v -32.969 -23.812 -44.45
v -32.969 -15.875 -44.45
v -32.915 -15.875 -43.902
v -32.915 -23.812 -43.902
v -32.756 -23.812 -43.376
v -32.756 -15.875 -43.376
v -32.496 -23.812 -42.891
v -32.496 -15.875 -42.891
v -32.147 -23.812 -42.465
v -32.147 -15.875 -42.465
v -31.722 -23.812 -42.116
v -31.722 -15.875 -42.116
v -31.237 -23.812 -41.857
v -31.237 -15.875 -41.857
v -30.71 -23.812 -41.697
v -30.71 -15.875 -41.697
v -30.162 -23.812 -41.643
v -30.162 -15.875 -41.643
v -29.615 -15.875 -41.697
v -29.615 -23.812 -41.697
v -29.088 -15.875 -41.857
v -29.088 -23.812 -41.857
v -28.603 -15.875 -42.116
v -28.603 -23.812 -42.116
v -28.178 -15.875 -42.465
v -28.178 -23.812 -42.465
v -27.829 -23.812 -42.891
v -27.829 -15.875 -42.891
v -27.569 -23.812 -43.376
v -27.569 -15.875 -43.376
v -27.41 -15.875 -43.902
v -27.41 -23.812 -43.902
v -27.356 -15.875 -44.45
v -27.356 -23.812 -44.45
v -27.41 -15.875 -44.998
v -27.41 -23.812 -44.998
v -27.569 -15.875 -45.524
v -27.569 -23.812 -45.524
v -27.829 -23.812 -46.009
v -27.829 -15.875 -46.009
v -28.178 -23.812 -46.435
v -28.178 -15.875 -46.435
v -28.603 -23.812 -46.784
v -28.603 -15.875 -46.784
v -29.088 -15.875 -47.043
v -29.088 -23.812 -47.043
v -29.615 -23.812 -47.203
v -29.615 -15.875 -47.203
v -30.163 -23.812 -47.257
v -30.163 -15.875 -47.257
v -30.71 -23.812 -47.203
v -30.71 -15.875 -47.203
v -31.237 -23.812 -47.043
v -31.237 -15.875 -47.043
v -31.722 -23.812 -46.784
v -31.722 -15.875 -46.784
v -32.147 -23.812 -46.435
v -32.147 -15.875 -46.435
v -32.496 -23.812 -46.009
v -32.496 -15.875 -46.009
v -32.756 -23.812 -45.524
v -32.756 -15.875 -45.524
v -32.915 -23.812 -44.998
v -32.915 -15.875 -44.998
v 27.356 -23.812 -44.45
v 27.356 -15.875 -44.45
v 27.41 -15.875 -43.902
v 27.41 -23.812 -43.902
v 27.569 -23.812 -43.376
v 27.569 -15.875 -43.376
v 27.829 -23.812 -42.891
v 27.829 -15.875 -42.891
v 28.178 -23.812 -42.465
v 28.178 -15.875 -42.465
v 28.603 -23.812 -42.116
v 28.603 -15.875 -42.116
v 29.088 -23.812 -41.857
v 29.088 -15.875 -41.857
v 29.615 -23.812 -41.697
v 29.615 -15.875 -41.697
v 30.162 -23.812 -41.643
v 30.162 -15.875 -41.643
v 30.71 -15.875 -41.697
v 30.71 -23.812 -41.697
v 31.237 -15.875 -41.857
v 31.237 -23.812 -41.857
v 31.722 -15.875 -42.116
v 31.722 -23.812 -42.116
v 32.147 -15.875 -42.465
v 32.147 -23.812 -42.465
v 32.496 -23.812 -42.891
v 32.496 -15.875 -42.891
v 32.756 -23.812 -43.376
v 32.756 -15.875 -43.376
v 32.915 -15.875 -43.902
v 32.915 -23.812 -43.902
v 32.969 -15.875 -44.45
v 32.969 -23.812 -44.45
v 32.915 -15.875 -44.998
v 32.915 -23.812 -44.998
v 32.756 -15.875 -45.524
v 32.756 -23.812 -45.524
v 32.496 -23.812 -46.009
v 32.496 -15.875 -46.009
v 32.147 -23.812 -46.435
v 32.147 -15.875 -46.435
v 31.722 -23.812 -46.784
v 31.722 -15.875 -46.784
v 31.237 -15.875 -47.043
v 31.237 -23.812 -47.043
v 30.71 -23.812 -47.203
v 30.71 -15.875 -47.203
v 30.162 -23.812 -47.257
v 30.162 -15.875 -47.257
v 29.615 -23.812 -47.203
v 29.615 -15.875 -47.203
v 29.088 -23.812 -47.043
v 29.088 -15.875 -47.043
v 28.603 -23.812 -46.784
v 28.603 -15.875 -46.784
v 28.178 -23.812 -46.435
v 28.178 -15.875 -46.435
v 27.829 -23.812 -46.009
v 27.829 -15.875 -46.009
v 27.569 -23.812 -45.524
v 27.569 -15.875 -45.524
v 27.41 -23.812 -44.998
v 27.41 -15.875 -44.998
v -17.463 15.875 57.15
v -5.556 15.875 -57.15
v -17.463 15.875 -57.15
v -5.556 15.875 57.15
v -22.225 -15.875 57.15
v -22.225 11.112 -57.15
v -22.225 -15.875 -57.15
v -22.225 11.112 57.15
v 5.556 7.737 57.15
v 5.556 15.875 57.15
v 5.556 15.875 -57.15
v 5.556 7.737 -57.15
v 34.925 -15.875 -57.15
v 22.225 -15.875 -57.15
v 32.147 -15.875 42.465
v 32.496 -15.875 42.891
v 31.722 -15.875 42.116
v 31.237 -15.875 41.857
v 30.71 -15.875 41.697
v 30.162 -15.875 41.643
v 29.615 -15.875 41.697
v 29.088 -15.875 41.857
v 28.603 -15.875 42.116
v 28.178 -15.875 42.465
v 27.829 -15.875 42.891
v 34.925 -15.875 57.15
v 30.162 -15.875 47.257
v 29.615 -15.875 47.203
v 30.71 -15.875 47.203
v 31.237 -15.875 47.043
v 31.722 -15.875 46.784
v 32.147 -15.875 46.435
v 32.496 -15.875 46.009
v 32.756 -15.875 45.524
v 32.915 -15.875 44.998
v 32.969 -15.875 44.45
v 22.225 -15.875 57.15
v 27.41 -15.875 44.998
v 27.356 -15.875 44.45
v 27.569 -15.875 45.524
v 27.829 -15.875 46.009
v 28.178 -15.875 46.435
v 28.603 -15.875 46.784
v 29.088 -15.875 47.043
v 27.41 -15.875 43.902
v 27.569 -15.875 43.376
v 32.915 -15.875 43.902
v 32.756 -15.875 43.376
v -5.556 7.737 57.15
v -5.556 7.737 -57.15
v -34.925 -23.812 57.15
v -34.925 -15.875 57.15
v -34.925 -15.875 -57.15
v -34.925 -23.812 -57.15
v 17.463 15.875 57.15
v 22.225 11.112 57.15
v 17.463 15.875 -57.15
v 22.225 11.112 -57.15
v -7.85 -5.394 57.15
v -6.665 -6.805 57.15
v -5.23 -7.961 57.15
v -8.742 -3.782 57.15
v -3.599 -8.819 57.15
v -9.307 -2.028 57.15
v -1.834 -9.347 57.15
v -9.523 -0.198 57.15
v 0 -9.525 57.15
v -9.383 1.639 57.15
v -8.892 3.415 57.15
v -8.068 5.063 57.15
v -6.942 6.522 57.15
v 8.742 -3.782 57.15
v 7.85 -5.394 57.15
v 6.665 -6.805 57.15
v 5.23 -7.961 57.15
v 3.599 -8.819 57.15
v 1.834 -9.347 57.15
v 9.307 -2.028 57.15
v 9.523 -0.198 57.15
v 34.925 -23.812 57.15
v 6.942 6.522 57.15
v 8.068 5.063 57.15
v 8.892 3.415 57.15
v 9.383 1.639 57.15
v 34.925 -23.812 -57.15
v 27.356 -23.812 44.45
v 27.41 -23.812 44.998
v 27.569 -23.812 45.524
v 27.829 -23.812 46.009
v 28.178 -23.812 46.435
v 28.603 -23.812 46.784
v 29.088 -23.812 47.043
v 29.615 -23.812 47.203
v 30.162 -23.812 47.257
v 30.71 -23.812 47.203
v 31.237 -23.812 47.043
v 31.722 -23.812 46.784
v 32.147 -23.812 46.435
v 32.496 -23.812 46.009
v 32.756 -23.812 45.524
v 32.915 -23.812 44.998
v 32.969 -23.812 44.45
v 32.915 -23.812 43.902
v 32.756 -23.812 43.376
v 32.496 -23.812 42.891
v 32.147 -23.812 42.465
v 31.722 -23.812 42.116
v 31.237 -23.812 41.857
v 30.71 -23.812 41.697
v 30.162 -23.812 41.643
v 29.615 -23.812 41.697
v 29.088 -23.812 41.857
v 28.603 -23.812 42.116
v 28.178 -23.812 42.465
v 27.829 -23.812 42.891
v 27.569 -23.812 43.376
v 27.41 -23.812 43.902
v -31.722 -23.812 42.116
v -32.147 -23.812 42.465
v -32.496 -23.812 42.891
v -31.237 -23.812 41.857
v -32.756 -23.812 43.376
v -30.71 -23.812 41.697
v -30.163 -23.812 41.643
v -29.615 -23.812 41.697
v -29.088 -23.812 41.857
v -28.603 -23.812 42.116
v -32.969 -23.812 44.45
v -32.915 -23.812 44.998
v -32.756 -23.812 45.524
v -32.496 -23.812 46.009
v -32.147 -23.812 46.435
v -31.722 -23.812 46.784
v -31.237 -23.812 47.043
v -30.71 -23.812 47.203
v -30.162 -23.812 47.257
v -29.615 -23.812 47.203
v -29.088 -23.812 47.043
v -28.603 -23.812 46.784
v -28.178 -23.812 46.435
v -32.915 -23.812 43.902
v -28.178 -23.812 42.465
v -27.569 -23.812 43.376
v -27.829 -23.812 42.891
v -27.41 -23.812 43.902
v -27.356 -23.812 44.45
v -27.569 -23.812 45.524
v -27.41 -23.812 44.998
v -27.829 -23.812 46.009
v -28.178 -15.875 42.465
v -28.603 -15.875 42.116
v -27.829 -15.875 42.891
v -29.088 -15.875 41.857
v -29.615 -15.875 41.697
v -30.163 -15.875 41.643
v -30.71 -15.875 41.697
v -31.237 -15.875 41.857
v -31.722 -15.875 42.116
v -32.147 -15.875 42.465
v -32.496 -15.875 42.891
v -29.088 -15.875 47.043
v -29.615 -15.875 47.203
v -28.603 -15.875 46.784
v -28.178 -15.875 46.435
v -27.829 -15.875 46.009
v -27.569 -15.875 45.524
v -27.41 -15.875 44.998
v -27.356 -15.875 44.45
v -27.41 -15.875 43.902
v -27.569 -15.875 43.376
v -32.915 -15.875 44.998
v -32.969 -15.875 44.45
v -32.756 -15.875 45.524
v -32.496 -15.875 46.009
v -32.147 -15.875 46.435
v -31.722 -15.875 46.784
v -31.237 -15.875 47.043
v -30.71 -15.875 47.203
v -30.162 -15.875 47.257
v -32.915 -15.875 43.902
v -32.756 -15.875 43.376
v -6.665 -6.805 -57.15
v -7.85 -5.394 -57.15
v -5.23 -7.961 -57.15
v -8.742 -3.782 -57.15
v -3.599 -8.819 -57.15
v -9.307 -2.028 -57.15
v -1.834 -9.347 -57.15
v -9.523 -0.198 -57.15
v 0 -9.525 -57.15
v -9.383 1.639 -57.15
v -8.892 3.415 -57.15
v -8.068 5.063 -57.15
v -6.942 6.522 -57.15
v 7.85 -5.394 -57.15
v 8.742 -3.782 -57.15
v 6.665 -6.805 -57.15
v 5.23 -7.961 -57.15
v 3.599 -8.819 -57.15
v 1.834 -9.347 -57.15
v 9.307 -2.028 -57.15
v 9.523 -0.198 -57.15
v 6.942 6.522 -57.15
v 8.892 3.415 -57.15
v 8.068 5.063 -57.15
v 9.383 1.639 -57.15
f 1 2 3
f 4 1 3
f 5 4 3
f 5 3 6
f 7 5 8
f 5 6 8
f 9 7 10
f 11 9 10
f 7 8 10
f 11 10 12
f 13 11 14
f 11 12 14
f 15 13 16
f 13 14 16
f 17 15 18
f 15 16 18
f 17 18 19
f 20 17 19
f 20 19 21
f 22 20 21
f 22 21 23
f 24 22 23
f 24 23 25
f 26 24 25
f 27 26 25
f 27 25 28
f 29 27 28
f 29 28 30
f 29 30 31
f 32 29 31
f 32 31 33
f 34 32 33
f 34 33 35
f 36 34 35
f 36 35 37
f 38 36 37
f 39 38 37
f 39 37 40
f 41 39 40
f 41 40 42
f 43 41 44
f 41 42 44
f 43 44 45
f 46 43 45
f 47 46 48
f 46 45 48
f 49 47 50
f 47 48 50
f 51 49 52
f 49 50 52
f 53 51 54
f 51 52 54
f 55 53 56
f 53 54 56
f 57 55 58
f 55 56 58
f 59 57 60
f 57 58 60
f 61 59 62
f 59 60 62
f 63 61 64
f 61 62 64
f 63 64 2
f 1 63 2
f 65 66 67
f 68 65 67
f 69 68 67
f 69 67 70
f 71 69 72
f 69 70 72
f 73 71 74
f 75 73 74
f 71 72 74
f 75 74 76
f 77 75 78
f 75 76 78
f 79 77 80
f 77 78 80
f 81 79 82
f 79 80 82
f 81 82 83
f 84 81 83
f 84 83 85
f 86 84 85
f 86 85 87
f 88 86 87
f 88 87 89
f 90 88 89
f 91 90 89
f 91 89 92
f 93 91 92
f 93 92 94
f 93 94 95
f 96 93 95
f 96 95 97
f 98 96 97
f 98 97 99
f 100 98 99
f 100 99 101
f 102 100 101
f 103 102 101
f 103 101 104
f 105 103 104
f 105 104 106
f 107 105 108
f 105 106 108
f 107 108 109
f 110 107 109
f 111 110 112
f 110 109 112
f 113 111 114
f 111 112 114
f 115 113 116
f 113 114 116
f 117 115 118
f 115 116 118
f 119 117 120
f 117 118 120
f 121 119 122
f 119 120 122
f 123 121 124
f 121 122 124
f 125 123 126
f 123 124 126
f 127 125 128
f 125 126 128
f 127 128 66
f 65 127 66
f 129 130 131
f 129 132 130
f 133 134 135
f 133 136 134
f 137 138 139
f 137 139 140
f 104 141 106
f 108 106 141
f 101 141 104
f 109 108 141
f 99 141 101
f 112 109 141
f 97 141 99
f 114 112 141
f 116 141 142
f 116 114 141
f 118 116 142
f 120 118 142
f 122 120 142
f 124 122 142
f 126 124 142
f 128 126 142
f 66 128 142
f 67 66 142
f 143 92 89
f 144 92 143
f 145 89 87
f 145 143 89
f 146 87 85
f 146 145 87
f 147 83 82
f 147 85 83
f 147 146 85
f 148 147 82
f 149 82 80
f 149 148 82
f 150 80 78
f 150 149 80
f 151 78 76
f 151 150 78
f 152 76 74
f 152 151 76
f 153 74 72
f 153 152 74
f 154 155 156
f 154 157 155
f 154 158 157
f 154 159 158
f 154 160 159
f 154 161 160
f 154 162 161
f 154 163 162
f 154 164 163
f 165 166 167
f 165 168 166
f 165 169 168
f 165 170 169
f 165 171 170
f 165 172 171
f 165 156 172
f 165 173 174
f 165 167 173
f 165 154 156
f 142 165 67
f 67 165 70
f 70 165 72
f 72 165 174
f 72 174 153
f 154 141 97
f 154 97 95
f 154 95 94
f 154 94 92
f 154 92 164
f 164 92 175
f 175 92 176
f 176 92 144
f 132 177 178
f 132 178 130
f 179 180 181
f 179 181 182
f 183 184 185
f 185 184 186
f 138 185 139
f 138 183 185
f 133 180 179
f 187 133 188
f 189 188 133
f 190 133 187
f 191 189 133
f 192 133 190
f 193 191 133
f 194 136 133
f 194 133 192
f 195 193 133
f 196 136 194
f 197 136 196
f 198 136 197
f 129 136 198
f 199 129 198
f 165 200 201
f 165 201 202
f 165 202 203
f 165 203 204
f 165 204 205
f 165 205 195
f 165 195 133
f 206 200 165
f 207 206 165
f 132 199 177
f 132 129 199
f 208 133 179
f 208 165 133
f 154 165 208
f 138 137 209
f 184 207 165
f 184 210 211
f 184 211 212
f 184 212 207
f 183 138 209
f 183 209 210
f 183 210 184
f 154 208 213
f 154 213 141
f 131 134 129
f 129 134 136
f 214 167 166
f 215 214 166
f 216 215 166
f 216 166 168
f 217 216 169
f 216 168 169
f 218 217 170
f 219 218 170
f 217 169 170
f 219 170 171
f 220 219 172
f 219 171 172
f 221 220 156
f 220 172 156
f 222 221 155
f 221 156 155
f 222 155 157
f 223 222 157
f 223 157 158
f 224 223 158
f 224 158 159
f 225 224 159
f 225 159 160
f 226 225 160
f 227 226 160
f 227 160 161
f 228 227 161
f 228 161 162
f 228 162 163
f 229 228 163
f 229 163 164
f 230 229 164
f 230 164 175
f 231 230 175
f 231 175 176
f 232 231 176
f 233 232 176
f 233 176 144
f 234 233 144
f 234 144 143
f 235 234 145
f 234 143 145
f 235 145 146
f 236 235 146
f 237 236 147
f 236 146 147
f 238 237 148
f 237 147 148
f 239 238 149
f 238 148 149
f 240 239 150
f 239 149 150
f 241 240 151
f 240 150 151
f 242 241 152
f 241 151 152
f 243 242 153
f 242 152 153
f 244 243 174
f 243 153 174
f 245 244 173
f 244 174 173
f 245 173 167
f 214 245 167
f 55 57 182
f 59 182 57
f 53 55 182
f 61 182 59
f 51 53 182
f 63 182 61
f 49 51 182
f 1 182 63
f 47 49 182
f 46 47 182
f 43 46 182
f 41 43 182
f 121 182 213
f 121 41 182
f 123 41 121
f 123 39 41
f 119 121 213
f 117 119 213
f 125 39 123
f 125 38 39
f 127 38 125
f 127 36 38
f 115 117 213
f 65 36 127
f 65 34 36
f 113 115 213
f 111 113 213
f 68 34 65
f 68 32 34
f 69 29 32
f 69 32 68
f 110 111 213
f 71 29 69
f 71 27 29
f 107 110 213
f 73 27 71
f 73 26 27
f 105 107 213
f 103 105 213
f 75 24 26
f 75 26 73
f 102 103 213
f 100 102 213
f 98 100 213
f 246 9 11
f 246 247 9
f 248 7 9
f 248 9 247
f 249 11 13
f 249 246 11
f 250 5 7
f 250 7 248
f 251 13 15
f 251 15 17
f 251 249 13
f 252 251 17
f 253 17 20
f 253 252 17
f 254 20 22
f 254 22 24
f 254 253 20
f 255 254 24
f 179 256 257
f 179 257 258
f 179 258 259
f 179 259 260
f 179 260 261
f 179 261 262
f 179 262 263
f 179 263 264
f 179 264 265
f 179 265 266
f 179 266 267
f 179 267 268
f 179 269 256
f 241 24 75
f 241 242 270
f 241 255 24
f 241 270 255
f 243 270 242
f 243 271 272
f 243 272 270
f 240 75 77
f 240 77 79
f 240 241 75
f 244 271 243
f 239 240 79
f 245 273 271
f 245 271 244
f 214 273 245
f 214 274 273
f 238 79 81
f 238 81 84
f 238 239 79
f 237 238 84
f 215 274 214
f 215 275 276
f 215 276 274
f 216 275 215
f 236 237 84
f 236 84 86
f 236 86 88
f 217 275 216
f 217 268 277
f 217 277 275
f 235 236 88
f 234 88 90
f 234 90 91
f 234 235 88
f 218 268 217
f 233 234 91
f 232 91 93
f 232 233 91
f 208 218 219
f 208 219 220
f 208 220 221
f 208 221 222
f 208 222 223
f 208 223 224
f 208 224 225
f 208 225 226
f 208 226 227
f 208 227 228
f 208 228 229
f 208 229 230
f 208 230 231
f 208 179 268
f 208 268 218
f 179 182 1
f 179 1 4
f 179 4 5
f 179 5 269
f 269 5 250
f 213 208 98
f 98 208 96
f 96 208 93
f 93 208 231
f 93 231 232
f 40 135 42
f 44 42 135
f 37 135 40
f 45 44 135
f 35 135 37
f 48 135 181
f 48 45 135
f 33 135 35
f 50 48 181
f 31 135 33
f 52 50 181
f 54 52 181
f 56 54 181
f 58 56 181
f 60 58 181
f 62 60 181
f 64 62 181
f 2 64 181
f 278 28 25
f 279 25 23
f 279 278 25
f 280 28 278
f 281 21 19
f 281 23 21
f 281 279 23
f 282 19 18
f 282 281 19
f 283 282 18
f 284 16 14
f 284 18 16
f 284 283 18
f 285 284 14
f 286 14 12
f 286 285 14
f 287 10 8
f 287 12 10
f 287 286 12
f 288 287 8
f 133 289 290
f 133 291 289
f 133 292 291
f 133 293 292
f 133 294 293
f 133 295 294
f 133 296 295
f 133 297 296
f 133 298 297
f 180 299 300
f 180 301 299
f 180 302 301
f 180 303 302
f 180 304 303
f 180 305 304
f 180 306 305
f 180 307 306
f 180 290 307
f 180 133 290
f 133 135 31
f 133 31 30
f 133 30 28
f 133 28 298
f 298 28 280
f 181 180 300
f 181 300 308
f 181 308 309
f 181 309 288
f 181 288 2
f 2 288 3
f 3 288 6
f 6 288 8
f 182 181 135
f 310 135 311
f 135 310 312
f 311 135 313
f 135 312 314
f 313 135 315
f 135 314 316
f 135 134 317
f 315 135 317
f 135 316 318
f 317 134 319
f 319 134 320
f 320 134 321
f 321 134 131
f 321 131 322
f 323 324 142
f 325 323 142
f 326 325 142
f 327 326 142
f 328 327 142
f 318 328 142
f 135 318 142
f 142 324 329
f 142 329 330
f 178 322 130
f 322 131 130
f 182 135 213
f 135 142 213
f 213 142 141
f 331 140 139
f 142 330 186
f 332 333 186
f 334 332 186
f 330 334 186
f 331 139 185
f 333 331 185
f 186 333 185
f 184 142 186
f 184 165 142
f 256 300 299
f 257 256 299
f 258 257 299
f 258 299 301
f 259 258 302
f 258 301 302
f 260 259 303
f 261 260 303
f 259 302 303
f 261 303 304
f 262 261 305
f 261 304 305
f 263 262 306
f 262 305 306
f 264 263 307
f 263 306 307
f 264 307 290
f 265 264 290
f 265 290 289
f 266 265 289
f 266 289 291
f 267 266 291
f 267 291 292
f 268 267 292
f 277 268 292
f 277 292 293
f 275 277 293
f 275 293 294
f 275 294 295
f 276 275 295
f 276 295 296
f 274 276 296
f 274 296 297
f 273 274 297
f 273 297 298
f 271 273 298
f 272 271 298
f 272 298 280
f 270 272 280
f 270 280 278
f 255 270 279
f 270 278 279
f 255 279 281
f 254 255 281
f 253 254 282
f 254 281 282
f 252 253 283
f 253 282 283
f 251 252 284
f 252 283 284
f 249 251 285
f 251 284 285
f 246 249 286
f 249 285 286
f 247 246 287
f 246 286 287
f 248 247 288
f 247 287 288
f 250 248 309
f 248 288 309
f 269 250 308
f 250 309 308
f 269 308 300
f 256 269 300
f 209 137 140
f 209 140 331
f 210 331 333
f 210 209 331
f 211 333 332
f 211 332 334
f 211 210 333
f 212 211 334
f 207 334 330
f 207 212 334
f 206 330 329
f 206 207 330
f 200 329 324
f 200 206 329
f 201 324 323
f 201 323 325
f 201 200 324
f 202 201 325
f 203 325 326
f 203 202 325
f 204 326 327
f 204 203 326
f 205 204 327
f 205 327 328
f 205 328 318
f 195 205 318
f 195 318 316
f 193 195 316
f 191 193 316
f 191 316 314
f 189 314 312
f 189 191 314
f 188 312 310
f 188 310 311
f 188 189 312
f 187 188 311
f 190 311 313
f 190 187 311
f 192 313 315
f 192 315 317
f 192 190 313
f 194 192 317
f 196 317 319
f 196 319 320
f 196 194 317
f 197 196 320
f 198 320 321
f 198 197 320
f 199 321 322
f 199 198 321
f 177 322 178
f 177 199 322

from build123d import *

# Parameters (mm, degrees)
EXTRUDE1_DEPTH         = 57.15
F_10_CLEARANCE_HOLE1_D = 5.6134
CHAMFER1_SIZE          = 4.7625


with BuildPart() as part:
    # Sketch1 → Extrude1 (new, symmetric)
    with BuildSketch(Plane.XY):
        with BuildLine():
            Line((22.225, 15.875), (5.55625, 15.875))
            Line((5.55625, 15.875), (5.55625, 7.736518011))
            ThreePointArc((5.55625, 7.736518011), (0, -9.525), (-5.55625, 7.736518011))
            Line((-5.55625, 7.736518011), (-5.55625, 15.875))
            Line((-5.55625, 15.875), (-22.225, 15.875))
            Line((-22.225, 15.875), (-22.225, -15.875))
            Line((-22.225, -15.875), (-34.925, -15.875))
            Line((-34.925, -15.875), (-34.925, -23.8125))
            Line((-34.925, -23.8125), (34.925, -23.8125))
            Line((34.925, -23.8125), (34.925, -15.875))
            Line((34.925, -15.875), (22.225, -15.875))
            Line((22.225, -15.875), (22.225, 15.875))
        make_face()
    extrude(amount=EXTRUDE1_DEPTH, both=True)

    # #10 Clearance Hole1 (through all)
    with Locations(Plane.XZ.offset(23.8125)):
        with Locations((-30.1625, -44.45), (30.1625, -44.45), (-30.1625, 44.45), (30.1625, 44.45)):
            Hole(F_10_CLEARANCE_HOLE1_D / 2)

    # Chamfer1
    chamfer1_edges = [part.edges().sort_by_distance(p)[0] for p in [
        (-22.225, 15.875, 0),
        (22.225, 15.875, 0),
    ]]
    chamfer(chamfer1_edges, length=CHAMFER1_SIZE)


solid = part.part
